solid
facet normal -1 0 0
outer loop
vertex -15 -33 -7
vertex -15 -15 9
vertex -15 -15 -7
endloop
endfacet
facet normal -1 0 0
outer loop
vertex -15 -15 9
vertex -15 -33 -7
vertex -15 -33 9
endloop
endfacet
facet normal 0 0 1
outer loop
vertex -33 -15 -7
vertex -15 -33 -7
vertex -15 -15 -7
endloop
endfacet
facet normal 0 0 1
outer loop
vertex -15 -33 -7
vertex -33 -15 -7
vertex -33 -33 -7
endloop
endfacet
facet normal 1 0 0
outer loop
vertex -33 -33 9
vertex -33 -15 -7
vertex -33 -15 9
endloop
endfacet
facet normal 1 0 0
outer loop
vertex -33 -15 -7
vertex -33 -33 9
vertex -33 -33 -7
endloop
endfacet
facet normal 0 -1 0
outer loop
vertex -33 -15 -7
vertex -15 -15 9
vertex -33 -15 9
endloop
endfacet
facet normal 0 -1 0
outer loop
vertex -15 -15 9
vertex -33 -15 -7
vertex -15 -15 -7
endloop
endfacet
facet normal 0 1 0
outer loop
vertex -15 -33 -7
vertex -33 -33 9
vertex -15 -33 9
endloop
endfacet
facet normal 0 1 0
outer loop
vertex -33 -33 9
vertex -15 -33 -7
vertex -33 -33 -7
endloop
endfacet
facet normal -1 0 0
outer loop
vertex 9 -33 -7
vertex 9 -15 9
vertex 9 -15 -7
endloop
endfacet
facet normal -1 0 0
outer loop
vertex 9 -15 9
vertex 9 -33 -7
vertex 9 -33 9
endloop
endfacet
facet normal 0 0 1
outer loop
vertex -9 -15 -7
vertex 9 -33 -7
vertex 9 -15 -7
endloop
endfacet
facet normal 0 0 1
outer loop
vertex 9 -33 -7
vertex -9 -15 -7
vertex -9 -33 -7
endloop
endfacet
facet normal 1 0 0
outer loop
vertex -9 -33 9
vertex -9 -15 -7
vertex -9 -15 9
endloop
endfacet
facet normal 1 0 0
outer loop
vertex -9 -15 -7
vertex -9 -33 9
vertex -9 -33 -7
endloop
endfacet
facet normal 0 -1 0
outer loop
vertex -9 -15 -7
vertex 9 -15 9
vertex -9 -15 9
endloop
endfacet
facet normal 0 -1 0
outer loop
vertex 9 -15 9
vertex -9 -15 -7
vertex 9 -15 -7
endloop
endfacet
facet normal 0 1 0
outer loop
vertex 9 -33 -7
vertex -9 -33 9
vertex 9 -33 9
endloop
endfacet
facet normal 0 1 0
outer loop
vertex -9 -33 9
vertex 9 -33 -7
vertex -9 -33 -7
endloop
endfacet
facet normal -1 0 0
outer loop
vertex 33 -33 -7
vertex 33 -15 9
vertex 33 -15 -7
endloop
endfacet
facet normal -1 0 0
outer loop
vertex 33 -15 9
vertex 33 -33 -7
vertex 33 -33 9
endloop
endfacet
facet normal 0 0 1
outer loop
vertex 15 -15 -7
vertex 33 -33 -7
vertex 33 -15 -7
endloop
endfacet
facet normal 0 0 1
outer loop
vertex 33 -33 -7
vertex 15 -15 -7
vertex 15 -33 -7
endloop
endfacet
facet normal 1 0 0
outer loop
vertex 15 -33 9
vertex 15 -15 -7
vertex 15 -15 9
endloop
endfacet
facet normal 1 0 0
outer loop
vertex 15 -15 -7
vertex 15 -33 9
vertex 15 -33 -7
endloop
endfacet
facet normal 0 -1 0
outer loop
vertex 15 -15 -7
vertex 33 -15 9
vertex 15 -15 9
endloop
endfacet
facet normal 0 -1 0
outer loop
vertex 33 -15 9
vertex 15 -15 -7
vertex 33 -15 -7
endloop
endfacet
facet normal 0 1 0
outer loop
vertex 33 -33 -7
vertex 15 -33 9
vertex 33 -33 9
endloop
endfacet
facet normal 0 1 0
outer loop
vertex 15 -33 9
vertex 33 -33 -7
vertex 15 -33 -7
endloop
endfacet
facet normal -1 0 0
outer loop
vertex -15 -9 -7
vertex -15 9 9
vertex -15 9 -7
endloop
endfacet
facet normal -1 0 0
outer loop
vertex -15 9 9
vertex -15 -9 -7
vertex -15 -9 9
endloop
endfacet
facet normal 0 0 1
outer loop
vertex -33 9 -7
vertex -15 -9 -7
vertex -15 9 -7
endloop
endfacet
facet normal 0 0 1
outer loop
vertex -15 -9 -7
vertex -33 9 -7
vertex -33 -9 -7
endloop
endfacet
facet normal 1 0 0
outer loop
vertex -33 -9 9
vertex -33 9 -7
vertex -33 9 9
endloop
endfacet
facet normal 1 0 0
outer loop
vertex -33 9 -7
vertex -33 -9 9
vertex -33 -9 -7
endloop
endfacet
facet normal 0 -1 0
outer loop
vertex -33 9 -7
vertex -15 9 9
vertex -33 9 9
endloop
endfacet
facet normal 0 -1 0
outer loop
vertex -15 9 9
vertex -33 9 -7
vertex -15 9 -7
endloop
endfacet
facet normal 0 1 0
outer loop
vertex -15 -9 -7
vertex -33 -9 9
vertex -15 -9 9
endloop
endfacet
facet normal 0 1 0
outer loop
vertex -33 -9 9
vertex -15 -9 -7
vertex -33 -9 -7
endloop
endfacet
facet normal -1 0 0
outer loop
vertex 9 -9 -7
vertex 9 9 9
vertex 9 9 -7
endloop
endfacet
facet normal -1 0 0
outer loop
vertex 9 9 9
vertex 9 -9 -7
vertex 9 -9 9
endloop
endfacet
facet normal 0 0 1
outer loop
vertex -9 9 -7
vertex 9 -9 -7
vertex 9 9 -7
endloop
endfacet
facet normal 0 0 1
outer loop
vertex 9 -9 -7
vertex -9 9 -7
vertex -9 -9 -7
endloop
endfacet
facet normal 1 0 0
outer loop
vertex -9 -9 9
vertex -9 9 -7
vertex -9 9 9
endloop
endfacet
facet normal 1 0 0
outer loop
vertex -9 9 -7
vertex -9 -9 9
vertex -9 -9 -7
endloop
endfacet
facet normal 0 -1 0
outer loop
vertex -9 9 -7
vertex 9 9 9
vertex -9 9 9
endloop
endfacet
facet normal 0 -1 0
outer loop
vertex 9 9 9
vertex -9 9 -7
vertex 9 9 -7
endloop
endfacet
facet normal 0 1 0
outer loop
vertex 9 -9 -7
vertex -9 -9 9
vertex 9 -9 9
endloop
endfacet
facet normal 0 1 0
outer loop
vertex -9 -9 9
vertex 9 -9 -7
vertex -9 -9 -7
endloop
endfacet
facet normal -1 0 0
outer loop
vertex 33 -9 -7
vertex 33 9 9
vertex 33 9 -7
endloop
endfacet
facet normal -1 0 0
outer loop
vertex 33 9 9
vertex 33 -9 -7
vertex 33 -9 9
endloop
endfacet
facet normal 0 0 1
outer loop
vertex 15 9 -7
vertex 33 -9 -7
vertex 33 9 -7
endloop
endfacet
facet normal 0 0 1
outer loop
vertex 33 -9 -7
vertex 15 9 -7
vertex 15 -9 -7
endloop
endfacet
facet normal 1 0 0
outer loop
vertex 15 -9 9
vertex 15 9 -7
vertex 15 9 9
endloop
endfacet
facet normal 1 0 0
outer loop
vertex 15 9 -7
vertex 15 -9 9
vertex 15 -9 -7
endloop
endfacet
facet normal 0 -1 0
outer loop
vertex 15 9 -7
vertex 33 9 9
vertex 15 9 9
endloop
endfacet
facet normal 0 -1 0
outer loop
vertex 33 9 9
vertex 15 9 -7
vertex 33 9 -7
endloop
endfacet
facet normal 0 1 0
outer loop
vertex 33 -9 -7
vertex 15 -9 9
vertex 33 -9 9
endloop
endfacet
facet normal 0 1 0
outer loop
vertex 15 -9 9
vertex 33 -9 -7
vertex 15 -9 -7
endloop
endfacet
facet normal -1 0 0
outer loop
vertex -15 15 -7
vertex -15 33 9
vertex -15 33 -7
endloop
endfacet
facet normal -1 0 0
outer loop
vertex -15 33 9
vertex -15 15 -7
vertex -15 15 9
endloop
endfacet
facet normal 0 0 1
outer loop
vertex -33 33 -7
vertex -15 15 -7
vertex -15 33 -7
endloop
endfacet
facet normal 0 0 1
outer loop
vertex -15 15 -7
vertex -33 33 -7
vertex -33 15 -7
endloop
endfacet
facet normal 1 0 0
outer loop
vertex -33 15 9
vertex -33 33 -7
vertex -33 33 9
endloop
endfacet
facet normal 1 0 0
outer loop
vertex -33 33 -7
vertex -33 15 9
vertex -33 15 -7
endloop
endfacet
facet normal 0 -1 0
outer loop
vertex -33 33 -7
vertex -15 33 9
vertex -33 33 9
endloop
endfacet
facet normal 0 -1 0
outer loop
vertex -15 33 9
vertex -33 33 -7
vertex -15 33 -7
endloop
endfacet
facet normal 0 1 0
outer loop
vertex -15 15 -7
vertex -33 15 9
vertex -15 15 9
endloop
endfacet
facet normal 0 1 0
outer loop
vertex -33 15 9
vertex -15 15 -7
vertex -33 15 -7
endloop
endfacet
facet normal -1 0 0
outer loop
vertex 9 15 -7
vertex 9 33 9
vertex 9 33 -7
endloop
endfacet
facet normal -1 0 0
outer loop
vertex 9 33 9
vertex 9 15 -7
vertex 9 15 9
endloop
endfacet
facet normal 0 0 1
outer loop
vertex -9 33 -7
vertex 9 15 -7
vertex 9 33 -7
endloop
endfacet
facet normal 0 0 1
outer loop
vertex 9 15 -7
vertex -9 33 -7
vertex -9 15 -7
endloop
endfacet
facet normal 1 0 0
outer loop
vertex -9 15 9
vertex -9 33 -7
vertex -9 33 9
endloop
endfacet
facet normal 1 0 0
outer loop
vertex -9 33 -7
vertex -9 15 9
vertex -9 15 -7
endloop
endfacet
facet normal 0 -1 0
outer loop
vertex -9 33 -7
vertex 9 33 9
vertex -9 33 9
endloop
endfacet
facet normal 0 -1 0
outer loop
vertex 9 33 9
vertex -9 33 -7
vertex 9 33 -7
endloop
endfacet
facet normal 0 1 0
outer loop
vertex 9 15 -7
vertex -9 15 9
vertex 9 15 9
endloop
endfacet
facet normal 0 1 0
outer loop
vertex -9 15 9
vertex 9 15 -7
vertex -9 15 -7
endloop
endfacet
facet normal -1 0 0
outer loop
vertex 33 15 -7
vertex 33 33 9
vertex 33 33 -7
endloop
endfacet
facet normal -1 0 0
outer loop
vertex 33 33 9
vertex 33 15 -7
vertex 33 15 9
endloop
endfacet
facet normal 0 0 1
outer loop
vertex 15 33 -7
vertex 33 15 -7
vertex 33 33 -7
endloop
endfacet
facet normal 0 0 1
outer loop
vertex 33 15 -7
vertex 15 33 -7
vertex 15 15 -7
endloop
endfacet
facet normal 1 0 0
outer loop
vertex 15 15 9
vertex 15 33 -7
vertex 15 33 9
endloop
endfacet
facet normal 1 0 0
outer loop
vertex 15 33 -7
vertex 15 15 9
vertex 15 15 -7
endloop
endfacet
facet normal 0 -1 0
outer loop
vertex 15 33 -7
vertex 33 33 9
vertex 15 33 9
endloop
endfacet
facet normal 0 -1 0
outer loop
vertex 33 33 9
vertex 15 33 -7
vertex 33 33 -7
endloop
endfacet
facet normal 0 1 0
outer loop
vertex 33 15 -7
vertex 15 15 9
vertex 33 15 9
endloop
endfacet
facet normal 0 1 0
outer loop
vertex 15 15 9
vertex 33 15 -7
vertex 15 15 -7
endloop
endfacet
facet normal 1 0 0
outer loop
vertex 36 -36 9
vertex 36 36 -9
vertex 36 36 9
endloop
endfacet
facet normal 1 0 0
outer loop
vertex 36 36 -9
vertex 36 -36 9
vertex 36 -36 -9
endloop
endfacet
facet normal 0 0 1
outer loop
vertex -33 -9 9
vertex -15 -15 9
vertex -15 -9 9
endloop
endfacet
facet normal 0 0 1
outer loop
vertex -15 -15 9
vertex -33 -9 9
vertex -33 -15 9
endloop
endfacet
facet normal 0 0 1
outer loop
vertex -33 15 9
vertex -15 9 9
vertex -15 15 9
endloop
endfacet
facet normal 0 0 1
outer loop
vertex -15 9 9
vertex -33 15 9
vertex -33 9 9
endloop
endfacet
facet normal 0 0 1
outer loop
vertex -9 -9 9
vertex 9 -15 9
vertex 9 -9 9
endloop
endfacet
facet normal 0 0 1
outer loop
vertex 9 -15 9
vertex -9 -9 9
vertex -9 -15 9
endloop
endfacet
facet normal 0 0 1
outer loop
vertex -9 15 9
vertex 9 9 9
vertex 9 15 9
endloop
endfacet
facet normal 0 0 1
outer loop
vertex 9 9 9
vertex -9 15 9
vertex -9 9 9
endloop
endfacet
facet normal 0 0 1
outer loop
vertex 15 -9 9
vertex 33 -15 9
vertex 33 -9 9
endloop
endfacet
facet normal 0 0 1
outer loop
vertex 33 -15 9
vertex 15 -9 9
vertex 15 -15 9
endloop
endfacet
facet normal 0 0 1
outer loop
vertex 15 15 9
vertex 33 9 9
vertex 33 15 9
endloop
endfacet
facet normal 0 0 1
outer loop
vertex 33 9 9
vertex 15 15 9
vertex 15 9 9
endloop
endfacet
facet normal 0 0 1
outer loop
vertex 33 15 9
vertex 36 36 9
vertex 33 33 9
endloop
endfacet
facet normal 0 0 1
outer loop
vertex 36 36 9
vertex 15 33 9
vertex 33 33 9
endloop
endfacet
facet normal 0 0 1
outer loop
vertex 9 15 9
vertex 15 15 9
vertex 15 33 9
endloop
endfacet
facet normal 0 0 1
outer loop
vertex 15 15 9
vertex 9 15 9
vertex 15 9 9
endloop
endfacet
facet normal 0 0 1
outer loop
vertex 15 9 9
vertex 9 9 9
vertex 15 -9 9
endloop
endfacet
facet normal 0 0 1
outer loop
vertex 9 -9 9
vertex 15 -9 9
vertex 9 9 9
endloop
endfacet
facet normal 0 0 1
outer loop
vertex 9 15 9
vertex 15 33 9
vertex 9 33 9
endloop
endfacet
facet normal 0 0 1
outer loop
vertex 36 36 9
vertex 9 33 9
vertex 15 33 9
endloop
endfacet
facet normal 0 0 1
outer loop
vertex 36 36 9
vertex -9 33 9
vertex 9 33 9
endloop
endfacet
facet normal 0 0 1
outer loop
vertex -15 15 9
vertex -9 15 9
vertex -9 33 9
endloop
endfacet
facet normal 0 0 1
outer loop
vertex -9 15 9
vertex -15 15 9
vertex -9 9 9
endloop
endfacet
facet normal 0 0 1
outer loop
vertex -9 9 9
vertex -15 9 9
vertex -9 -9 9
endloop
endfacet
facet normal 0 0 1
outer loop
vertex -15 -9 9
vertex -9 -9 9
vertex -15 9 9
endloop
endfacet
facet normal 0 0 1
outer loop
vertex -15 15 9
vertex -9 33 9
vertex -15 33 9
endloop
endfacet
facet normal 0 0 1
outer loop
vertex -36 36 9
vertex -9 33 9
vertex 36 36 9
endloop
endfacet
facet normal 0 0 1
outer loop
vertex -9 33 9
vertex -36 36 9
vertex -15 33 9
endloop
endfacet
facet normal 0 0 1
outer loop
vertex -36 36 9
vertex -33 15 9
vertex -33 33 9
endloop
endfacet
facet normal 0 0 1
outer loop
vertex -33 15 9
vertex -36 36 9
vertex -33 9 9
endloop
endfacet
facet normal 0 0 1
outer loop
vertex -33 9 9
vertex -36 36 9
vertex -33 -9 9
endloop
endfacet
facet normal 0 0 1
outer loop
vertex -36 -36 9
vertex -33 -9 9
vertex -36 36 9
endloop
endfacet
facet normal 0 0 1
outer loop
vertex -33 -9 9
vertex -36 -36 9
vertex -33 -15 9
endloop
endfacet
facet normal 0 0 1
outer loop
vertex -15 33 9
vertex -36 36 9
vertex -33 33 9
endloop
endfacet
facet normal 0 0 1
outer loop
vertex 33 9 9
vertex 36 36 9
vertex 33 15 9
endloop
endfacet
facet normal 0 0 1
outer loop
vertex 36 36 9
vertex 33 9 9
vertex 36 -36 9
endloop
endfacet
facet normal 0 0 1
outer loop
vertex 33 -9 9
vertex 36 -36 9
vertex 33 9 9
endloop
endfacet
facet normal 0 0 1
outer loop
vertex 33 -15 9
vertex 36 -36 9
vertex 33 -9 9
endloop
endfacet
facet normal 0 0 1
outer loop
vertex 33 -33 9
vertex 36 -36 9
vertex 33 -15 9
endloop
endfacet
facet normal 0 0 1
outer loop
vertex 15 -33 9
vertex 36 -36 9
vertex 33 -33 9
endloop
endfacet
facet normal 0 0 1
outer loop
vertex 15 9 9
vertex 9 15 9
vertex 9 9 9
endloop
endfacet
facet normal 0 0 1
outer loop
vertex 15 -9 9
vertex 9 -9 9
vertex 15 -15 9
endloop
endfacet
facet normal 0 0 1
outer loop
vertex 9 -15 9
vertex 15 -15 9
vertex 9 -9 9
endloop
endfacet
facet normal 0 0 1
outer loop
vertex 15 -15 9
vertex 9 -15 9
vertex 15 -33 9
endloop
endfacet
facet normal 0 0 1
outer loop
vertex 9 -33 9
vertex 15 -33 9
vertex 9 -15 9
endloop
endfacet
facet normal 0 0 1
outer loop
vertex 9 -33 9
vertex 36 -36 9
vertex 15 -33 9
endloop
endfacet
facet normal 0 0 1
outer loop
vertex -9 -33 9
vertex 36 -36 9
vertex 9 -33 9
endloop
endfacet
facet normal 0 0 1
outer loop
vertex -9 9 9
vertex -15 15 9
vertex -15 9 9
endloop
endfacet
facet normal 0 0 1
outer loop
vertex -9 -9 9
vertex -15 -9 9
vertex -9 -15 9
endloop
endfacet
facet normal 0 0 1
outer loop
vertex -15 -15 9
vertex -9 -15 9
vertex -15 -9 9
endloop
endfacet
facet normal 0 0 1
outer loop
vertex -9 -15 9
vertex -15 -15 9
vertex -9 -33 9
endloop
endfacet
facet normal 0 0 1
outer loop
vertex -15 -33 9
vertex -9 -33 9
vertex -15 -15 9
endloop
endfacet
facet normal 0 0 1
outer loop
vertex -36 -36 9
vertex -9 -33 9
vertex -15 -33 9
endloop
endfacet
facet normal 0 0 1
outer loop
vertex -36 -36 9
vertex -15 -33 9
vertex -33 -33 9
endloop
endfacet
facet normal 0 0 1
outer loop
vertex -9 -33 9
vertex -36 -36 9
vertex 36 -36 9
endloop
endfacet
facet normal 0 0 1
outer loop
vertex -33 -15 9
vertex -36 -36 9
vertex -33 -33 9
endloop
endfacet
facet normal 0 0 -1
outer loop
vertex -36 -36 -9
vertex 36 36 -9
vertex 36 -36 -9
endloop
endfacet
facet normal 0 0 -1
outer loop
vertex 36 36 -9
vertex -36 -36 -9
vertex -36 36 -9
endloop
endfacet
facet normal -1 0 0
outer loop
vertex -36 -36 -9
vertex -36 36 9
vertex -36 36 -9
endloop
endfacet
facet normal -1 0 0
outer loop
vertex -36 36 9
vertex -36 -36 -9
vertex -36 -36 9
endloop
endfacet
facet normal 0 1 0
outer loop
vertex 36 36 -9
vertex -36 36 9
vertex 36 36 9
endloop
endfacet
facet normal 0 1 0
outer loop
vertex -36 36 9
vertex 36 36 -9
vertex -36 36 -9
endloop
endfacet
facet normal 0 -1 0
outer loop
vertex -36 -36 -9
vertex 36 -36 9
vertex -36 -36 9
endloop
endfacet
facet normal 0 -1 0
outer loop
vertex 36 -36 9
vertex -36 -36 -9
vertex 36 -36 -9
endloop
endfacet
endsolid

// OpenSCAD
$fn = 32;

// ----------------------------------------------------------------------
// Pocket plate 72 x 72 x 18
// 3 x 3 pockets 18 mm square, 16 mm deep
// ----------------------------------------------------------------------

// --- parameters (mm) ---
thickness = 18;  // plate thickness
floor_t = 2;     // material left under each pocket
pocket = 18;     // pocket side length
pitch_x = 24;    // pocket pitch along X
pitch_y = 24;    // pocket pitch along Y
cols = 3;        // pockets per row
rows = 3;        // rows of pockets

// --- derived feature positions (mm) ---
depth = thickness - floor_t;        // = 16   pocket depth, down to the floor
span_x = (cols - 1) * pitch_x;      // = 48   distance between outer pockets
span_y = (rows - 1) * pitch_y;      // = 48   distance between outer pocket rows
origin_x = -span_x / 2;             // = -24   X of the first pocket
origin_y = -span_y / 2;             // = -24   Y of the first pocket
plate = [span_x + pocket + 6, span_y + pocket + 6, thickness];  // = [72, 72, 18]   overall size: pockets plus 3 mm of wall on each side
feature_centers = [
  [origin_x + 0 * pitch_x, origin_y + 0 * pitch_y],
  [origin_x + 1 * pitch_x, origin_y + 0 * pitch_y],
  [origin_x + 2 * pitch_x, origin_y + 0 * pitch_y],
  [origin_x + 0 * pitch_x, origin_y + 1 * pitch_y],
  [origin_x + 1 * pitch_x, origin_y + 1 * pitch_y],
  [origin_x + 2 * pitch_x, origin_y + 1 * pitch_y],
  [origin_x + 0 * pitch_x, origin_y + 2 * pitch_y],
  [origin_x + 1 * pitch_x, origin_y + 2 * pitch_y],
  [origin_x + 2 * pitch_x, origin_y + 2 * pitch_y]
];   // pocket centres, used verbatim by the cutter loop

// plate outline, then one pocket per centre in feature_centers
difference() {
  cube(plate, center = true);
  for (centre = feature_centers)
    translate([centre[0] - pocket / 2, centre[1] - pocket / 2, plate[2] / 2 - depth])
      cube([pocket, pocket, depth + 1]);  // centred on the declared pocket centre
}
